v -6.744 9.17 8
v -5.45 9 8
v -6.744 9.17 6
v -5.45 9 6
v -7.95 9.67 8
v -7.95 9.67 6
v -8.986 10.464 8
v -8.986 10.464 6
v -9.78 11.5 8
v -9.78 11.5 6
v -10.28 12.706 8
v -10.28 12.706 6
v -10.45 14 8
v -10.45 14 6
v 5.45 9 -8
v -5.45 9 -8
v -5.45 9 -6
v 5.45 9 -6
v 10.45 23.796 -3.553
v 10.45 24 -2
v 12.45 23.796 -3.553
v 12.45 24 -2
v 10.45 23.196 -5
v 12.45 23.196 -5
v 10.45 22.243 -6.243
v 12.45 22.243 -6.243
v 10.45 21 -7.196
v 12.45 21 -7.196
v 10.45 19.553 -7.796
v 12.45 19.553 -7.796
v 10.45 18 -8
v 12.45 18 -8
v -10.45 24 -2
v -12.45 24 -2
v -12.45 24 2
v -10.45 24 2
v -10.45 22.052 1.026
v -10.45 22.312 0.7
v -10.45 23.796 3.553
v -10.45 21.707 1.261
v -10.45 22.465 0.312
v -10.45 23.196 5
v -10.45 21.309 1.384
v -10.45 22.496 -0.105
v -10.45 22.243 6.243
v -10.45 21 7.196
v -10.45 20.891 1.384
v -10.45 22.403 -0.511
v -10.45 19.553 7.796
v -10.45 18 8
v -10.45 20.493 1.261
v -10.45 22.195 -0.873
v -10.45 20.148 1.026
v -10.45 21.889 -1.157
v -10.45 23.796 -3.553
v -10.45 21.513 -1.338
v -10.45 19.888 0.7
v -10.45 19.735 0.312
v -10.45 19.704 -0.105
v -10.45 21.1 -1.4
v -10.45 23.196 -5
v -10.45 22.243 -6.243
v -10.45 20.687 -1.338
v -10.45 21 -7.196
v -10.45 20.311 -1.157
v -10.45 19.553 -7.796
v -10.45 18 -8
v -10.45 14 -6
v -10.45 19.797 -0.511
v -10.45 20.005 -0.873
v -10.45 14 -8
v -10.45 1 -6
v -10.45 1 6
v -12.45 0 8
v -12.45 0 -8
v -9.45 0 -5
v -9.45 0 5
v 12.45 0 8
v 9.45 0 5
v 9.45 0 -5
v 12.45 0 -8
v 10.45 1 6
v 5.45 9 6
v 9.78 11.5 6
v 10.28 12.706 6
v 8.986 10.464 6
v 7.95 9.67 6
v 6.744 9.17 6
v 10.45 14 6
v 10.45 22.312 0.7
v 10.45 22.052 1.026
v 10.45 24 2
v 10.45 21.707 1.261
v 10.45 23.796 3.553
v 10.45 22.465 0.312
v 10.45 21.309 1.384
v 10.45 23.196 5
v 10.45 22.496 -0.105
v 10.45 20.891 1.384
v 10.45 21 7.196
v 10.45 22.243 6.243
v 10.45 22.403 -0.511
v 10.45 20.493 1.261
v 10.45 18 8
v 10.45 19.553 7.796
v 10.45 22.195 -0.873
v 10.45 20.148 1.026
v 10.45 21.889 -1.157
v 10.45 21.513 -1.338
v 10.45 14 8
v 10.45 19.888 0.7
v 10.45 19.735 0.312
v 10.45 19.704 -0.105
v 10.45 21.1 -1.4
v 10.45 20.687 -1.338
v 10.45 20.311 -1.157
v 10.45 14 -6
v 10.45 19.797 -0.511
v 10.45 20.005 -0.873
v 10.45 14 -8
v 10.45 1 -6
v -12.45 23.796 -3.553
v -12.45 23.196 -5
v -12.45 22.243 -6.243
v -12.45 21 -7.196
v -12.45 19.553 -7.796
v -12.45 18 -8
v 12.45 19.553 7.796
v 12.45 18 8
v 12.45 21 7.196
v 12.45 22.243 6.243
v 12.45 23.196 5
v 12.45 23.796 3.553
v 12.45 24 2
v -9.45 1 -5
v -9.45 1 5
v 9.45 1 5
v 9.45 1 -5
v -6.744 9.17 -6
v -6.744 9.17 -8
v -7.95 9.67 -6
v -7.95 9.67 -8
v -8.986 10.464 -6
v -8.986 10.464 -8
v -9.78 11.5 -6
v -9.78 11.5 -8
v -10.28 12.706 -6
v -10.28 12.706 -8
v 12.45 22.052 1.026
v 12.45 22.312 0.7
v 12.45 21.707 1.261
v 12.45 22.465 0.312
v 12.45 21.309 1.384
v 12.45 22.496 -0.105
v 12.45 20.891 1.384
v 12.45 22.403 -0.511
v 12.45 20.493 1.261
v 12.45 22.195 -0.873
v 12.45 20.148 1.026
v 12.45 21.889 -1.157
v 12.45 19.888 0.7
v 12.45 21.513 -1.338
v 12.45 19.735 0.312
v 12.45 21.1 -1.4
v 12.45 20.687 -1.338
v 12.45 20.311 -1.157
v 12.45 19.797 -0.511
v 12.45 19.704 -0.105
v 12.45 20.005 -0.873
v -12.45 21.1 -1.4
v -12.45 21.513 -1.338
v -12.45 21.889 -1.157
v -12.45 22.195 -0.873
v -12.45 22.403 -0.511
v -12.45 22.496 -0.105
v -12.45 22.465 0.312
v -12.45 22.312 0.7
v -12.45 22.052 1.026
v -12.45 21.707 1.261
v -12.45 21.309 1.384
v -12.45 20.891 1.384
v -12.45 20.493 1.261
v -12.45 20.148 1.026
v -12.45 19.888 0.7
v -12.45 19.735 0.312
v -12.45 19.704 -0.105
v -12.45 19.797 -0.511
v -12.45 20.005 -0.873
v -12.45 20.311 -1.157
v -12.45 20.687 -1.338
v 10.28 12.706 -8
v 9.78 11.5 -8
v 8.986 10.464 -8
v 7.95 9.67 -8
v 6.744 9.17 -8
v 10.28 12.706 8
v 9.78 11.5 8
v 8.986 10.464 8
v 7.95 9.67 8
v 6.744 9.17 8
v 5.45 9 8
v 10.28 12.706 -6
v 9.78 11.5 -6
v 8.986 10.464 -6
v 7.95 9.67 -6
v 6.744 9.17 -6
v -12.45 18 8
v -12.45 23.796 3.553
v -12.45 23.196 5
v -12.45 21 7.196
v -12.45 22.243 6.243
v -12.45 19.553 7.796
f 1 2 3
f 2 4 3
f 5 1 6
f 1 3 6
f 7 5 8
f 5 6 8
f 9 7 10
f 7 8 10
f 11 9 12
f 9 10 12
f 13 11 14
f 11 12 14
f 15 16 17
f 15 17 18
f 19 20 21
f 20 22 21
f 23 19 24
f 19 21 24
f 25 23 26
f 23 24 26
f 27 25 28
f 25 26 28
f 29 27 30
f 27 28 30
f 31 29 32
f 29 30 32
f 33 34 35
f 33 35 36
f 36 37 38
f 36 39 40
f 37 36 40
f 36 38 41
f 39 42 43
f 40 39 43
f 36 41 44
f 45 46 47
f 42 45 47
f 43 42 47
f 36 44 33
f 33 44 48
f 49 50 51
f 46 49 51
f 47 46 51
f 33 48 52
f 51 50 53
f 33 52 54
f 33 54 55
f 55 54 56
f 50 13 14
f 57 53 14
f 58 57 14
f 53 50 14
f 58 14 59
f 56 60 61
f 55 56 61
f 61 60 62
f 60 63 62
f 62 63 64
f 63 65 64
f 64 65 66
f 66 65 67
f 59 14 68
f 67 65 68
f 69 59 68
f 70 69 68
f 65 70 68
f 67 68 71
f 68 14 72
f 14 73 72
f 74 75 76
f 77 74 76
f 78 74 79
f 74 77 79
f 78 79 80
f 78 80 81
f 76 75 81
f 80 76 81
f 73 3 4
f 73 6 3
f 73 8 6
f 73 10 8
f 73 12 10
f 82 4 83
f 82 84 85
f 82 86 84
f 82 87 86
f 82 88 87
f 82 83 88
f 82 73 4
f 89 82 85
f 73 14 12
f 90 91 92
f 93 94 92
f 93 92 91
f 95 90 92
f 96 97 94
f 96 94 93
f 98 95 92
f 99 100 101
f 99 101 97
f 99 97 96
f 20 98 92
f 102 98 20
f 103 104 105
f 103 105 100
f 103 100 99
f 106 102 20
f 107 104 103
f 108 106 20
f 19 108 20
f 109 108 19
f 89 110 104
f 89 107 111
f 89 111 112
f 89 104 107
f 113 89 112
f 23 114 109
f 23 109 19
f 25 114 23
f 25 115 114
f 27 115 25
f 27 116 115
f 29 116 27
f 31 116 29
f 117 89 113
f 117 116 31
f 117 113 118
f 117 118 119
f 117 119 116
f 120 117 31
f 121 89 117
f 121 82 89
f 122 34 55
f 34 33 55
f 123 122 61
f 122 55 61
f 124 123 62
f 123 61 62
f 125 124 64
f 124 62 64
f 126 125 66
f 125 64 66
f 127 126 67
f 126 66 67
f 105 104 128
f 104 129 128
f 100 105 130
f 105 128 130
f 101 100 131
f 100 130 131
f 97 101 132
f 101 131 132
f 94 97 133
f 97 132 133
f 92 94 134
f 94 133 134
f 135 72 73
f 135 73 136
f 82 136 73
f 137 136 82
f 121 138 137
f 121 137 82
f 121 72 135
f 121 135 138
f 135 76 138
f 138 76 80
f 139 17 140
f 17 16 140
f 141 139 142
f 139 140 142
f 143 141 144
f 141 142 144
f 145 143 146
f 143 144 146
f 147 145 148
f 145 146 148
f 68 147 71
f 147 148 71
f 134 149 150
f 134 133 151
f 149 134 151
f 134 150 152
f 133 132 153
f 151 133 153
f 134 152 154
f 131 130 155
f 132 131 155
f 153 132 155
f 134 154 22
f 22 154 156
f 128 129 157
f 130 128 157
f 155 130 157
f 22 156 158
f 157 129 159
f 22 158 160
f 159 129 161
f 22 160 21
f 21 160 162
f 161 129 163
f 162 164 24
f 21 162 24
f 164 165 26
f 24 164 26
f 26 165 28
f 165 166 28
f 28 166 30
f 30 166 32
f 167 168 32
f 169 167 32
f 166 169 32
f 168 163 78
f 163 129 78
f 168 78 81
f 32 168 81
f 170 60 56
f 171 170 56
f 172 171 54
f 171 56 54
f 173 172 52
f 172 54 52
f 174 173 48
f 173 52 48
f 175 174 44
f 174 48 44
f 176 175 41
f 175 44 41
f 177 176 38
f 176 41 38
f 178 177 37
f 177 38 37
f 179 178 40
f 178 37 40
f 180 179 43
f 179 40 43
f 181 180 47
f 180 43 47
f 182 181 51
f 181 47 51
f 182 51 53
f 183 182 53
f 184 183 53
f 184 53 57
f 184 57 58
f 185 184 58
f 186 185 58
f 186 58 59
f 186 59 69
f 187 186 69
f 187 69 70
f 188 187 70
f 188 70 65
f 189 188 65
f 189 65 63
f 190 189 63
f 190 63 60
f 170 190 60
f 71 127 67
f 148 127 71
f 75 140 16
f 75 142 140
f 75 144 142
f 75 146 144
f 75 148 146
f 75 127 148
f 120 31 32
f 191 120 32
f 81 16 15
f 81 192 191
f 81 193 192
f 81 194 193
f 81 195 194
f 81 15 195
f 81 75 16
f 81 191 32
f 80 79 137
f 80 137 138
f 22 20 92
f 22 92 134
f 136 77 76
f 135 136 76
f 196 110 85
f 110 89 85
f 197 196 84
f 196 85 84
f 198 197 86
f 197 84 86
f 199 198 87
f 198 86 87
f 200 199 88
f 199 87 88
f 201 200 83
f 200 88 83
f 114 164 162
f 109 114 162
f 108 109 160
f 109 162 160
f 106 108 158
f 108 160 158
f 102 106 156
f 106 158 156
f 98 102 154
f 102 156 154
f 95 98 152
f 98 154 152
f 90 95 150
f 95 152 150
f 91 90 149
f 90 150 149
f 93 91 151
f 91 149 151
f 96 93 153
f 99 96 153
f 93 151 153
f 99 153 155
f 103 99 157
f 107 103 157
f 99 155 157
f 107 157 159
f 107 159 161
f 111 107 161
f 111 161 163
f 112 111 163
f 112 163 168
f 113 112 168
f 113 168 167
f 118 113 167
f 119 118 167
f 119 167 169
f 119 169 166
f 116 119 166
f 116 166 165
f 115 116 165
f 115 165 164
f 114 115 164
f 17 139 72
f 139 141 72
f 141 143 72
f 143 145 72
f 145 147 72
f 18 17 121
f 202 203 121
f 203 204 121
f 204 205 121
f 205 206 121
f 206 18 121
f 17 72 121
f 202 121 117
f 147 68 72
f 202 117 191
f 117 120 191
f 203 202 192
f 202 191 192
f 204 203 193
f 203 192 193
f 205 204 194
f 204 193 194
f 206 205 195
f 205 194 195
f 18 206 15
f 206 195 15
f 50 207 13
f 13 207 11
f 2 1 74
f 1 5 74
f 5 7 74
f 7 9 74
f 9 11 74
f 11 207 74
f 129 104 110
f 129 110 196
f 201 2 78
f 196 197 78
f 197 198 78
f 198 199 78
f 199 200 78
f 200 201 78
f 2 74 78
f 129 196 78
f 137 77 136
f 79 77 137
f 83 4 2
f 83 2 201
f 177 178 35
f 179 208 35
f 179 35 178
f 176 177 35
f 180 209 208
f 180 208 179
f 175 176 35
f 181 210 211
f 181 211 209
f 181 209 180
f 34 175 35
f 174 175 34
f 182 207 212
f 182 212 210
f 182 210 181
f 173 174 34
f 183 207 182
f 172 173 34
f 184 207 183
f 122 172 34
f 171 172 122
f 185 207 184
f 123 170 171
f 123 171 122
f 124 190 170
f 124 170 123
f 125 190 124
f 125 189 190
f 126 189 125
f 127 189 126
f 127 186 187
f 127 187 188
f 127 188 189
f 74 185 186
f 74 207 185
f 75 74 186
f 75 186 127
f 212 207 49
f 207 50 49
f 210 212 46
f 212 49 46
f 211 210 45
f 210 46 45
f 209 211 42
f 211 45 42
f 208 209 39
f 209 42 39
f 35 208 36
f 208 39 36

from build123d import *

# Parameters (mm, degrees)
SKETCH1_W           = 24.9
SKETCH1_H           = 16
SKETCH1_W_2         = 18.9
SKETCH1_H_2         = 10
BOSS_EXTRUDE1_DEPTH = 1
SKETCH2_W           = 24.9
SKETCH2_H           = 16
SKETCH2_W_2         = 20.9
SKETCH2_H_2         = 12
BOSS_EXTRUDE2_DEPTH = 8
SKETCH3_W           = 2
SKETCH3_H           = 16
BOSS_EXTRUDE3_DEPTH = 15
FILLET1_R           = 5
SKETCH4_R           = 1.4
CUT_EXTRUDE1_DEPTH  = 24.9
FILLET2_R           = 6


with BuildPart() as part:
    # Sketch1 → Boss-Extrude1 (new body)
    with BuildSketch(Plane(origin=(0, 0, 0), x_dir=(1, 0, 0), z_dir=(0, 1, 0))):
        Rectangle(SKETCH1_W, SKETCH1_H)
        Rectangle(SKETCH1_W_2, SKETCH1_H_2, mode=Mode.SUBTRACT)
    extrude(amount=BOSS_EXTRUDE1_DEPTH)

    # Sketch2 → Boss-Extrude2 (add)
    with BuildSketch(Plane(origin=(0, 1, 0), x_dir=(1, 0, 0), z_dir=(0, 1, 0))):
        Rectangle(SKETCH2_W, SKETCH2_H)
        Rectangle(SKETCH2_W_2, SKETCH2_H_2, mode=Mode.SUBTRACT)
    extrude(amount=BOSS_EXTRUDE2_DEPTH)

    # Sketch3 → Boss-Extrude3 (add)
    with BuildSketch(Plane(origin=(0, 9, 0), x_dir=(1, 0, 0), z_dir=(0, 1, 0))):
        with Locations((-11.45, 0)):
            Rectangle(SKETCH3_W, SKETCH3_H)
        with Locations((11.45, 0)):
            Rectangle(SKETCH3_W, SKETCH3_H)
    extrude(amount=BOSS_EXTRUDE3_DEPTH)

    # Fillet1
    fillet1_edges = [part.edges().sort_by_distance(p)[0] for p in [
        (-10.45, 9, -7),
        (-10.45, 9, 7),
        (10.45, 9, 7),
        (10.45, 9, -7),
    ]]
    fillet(fillet1_edges, radius=FILLET1_R)

    # Sketch4 → Cut-Extrude1 (cut)
    with BuildSketch(Plane(origin=(12.45, 0, 0), x_dir=(0, 0, -1), z_dir=(1, 0, 0))):
        with Locations((0, 21.1)):
            Circle(SKETCH4_R)
    extrude(amount=-CUT_EXTRUDE1_DEPTH, mode=Mode.SUBTRACT)

    # Fillet2
    fillet2_edges = [part.edges().sort_by_distance(p)[0] for p in [
        (11.45, 24, -8),
        (11.45, 24, 8),
        (-11.45, 24, 8),
        (-11.45, 24, -8),
    ]]
    fillet(fillet2_edges, radius=FILLET2_R)


solid = part.part
